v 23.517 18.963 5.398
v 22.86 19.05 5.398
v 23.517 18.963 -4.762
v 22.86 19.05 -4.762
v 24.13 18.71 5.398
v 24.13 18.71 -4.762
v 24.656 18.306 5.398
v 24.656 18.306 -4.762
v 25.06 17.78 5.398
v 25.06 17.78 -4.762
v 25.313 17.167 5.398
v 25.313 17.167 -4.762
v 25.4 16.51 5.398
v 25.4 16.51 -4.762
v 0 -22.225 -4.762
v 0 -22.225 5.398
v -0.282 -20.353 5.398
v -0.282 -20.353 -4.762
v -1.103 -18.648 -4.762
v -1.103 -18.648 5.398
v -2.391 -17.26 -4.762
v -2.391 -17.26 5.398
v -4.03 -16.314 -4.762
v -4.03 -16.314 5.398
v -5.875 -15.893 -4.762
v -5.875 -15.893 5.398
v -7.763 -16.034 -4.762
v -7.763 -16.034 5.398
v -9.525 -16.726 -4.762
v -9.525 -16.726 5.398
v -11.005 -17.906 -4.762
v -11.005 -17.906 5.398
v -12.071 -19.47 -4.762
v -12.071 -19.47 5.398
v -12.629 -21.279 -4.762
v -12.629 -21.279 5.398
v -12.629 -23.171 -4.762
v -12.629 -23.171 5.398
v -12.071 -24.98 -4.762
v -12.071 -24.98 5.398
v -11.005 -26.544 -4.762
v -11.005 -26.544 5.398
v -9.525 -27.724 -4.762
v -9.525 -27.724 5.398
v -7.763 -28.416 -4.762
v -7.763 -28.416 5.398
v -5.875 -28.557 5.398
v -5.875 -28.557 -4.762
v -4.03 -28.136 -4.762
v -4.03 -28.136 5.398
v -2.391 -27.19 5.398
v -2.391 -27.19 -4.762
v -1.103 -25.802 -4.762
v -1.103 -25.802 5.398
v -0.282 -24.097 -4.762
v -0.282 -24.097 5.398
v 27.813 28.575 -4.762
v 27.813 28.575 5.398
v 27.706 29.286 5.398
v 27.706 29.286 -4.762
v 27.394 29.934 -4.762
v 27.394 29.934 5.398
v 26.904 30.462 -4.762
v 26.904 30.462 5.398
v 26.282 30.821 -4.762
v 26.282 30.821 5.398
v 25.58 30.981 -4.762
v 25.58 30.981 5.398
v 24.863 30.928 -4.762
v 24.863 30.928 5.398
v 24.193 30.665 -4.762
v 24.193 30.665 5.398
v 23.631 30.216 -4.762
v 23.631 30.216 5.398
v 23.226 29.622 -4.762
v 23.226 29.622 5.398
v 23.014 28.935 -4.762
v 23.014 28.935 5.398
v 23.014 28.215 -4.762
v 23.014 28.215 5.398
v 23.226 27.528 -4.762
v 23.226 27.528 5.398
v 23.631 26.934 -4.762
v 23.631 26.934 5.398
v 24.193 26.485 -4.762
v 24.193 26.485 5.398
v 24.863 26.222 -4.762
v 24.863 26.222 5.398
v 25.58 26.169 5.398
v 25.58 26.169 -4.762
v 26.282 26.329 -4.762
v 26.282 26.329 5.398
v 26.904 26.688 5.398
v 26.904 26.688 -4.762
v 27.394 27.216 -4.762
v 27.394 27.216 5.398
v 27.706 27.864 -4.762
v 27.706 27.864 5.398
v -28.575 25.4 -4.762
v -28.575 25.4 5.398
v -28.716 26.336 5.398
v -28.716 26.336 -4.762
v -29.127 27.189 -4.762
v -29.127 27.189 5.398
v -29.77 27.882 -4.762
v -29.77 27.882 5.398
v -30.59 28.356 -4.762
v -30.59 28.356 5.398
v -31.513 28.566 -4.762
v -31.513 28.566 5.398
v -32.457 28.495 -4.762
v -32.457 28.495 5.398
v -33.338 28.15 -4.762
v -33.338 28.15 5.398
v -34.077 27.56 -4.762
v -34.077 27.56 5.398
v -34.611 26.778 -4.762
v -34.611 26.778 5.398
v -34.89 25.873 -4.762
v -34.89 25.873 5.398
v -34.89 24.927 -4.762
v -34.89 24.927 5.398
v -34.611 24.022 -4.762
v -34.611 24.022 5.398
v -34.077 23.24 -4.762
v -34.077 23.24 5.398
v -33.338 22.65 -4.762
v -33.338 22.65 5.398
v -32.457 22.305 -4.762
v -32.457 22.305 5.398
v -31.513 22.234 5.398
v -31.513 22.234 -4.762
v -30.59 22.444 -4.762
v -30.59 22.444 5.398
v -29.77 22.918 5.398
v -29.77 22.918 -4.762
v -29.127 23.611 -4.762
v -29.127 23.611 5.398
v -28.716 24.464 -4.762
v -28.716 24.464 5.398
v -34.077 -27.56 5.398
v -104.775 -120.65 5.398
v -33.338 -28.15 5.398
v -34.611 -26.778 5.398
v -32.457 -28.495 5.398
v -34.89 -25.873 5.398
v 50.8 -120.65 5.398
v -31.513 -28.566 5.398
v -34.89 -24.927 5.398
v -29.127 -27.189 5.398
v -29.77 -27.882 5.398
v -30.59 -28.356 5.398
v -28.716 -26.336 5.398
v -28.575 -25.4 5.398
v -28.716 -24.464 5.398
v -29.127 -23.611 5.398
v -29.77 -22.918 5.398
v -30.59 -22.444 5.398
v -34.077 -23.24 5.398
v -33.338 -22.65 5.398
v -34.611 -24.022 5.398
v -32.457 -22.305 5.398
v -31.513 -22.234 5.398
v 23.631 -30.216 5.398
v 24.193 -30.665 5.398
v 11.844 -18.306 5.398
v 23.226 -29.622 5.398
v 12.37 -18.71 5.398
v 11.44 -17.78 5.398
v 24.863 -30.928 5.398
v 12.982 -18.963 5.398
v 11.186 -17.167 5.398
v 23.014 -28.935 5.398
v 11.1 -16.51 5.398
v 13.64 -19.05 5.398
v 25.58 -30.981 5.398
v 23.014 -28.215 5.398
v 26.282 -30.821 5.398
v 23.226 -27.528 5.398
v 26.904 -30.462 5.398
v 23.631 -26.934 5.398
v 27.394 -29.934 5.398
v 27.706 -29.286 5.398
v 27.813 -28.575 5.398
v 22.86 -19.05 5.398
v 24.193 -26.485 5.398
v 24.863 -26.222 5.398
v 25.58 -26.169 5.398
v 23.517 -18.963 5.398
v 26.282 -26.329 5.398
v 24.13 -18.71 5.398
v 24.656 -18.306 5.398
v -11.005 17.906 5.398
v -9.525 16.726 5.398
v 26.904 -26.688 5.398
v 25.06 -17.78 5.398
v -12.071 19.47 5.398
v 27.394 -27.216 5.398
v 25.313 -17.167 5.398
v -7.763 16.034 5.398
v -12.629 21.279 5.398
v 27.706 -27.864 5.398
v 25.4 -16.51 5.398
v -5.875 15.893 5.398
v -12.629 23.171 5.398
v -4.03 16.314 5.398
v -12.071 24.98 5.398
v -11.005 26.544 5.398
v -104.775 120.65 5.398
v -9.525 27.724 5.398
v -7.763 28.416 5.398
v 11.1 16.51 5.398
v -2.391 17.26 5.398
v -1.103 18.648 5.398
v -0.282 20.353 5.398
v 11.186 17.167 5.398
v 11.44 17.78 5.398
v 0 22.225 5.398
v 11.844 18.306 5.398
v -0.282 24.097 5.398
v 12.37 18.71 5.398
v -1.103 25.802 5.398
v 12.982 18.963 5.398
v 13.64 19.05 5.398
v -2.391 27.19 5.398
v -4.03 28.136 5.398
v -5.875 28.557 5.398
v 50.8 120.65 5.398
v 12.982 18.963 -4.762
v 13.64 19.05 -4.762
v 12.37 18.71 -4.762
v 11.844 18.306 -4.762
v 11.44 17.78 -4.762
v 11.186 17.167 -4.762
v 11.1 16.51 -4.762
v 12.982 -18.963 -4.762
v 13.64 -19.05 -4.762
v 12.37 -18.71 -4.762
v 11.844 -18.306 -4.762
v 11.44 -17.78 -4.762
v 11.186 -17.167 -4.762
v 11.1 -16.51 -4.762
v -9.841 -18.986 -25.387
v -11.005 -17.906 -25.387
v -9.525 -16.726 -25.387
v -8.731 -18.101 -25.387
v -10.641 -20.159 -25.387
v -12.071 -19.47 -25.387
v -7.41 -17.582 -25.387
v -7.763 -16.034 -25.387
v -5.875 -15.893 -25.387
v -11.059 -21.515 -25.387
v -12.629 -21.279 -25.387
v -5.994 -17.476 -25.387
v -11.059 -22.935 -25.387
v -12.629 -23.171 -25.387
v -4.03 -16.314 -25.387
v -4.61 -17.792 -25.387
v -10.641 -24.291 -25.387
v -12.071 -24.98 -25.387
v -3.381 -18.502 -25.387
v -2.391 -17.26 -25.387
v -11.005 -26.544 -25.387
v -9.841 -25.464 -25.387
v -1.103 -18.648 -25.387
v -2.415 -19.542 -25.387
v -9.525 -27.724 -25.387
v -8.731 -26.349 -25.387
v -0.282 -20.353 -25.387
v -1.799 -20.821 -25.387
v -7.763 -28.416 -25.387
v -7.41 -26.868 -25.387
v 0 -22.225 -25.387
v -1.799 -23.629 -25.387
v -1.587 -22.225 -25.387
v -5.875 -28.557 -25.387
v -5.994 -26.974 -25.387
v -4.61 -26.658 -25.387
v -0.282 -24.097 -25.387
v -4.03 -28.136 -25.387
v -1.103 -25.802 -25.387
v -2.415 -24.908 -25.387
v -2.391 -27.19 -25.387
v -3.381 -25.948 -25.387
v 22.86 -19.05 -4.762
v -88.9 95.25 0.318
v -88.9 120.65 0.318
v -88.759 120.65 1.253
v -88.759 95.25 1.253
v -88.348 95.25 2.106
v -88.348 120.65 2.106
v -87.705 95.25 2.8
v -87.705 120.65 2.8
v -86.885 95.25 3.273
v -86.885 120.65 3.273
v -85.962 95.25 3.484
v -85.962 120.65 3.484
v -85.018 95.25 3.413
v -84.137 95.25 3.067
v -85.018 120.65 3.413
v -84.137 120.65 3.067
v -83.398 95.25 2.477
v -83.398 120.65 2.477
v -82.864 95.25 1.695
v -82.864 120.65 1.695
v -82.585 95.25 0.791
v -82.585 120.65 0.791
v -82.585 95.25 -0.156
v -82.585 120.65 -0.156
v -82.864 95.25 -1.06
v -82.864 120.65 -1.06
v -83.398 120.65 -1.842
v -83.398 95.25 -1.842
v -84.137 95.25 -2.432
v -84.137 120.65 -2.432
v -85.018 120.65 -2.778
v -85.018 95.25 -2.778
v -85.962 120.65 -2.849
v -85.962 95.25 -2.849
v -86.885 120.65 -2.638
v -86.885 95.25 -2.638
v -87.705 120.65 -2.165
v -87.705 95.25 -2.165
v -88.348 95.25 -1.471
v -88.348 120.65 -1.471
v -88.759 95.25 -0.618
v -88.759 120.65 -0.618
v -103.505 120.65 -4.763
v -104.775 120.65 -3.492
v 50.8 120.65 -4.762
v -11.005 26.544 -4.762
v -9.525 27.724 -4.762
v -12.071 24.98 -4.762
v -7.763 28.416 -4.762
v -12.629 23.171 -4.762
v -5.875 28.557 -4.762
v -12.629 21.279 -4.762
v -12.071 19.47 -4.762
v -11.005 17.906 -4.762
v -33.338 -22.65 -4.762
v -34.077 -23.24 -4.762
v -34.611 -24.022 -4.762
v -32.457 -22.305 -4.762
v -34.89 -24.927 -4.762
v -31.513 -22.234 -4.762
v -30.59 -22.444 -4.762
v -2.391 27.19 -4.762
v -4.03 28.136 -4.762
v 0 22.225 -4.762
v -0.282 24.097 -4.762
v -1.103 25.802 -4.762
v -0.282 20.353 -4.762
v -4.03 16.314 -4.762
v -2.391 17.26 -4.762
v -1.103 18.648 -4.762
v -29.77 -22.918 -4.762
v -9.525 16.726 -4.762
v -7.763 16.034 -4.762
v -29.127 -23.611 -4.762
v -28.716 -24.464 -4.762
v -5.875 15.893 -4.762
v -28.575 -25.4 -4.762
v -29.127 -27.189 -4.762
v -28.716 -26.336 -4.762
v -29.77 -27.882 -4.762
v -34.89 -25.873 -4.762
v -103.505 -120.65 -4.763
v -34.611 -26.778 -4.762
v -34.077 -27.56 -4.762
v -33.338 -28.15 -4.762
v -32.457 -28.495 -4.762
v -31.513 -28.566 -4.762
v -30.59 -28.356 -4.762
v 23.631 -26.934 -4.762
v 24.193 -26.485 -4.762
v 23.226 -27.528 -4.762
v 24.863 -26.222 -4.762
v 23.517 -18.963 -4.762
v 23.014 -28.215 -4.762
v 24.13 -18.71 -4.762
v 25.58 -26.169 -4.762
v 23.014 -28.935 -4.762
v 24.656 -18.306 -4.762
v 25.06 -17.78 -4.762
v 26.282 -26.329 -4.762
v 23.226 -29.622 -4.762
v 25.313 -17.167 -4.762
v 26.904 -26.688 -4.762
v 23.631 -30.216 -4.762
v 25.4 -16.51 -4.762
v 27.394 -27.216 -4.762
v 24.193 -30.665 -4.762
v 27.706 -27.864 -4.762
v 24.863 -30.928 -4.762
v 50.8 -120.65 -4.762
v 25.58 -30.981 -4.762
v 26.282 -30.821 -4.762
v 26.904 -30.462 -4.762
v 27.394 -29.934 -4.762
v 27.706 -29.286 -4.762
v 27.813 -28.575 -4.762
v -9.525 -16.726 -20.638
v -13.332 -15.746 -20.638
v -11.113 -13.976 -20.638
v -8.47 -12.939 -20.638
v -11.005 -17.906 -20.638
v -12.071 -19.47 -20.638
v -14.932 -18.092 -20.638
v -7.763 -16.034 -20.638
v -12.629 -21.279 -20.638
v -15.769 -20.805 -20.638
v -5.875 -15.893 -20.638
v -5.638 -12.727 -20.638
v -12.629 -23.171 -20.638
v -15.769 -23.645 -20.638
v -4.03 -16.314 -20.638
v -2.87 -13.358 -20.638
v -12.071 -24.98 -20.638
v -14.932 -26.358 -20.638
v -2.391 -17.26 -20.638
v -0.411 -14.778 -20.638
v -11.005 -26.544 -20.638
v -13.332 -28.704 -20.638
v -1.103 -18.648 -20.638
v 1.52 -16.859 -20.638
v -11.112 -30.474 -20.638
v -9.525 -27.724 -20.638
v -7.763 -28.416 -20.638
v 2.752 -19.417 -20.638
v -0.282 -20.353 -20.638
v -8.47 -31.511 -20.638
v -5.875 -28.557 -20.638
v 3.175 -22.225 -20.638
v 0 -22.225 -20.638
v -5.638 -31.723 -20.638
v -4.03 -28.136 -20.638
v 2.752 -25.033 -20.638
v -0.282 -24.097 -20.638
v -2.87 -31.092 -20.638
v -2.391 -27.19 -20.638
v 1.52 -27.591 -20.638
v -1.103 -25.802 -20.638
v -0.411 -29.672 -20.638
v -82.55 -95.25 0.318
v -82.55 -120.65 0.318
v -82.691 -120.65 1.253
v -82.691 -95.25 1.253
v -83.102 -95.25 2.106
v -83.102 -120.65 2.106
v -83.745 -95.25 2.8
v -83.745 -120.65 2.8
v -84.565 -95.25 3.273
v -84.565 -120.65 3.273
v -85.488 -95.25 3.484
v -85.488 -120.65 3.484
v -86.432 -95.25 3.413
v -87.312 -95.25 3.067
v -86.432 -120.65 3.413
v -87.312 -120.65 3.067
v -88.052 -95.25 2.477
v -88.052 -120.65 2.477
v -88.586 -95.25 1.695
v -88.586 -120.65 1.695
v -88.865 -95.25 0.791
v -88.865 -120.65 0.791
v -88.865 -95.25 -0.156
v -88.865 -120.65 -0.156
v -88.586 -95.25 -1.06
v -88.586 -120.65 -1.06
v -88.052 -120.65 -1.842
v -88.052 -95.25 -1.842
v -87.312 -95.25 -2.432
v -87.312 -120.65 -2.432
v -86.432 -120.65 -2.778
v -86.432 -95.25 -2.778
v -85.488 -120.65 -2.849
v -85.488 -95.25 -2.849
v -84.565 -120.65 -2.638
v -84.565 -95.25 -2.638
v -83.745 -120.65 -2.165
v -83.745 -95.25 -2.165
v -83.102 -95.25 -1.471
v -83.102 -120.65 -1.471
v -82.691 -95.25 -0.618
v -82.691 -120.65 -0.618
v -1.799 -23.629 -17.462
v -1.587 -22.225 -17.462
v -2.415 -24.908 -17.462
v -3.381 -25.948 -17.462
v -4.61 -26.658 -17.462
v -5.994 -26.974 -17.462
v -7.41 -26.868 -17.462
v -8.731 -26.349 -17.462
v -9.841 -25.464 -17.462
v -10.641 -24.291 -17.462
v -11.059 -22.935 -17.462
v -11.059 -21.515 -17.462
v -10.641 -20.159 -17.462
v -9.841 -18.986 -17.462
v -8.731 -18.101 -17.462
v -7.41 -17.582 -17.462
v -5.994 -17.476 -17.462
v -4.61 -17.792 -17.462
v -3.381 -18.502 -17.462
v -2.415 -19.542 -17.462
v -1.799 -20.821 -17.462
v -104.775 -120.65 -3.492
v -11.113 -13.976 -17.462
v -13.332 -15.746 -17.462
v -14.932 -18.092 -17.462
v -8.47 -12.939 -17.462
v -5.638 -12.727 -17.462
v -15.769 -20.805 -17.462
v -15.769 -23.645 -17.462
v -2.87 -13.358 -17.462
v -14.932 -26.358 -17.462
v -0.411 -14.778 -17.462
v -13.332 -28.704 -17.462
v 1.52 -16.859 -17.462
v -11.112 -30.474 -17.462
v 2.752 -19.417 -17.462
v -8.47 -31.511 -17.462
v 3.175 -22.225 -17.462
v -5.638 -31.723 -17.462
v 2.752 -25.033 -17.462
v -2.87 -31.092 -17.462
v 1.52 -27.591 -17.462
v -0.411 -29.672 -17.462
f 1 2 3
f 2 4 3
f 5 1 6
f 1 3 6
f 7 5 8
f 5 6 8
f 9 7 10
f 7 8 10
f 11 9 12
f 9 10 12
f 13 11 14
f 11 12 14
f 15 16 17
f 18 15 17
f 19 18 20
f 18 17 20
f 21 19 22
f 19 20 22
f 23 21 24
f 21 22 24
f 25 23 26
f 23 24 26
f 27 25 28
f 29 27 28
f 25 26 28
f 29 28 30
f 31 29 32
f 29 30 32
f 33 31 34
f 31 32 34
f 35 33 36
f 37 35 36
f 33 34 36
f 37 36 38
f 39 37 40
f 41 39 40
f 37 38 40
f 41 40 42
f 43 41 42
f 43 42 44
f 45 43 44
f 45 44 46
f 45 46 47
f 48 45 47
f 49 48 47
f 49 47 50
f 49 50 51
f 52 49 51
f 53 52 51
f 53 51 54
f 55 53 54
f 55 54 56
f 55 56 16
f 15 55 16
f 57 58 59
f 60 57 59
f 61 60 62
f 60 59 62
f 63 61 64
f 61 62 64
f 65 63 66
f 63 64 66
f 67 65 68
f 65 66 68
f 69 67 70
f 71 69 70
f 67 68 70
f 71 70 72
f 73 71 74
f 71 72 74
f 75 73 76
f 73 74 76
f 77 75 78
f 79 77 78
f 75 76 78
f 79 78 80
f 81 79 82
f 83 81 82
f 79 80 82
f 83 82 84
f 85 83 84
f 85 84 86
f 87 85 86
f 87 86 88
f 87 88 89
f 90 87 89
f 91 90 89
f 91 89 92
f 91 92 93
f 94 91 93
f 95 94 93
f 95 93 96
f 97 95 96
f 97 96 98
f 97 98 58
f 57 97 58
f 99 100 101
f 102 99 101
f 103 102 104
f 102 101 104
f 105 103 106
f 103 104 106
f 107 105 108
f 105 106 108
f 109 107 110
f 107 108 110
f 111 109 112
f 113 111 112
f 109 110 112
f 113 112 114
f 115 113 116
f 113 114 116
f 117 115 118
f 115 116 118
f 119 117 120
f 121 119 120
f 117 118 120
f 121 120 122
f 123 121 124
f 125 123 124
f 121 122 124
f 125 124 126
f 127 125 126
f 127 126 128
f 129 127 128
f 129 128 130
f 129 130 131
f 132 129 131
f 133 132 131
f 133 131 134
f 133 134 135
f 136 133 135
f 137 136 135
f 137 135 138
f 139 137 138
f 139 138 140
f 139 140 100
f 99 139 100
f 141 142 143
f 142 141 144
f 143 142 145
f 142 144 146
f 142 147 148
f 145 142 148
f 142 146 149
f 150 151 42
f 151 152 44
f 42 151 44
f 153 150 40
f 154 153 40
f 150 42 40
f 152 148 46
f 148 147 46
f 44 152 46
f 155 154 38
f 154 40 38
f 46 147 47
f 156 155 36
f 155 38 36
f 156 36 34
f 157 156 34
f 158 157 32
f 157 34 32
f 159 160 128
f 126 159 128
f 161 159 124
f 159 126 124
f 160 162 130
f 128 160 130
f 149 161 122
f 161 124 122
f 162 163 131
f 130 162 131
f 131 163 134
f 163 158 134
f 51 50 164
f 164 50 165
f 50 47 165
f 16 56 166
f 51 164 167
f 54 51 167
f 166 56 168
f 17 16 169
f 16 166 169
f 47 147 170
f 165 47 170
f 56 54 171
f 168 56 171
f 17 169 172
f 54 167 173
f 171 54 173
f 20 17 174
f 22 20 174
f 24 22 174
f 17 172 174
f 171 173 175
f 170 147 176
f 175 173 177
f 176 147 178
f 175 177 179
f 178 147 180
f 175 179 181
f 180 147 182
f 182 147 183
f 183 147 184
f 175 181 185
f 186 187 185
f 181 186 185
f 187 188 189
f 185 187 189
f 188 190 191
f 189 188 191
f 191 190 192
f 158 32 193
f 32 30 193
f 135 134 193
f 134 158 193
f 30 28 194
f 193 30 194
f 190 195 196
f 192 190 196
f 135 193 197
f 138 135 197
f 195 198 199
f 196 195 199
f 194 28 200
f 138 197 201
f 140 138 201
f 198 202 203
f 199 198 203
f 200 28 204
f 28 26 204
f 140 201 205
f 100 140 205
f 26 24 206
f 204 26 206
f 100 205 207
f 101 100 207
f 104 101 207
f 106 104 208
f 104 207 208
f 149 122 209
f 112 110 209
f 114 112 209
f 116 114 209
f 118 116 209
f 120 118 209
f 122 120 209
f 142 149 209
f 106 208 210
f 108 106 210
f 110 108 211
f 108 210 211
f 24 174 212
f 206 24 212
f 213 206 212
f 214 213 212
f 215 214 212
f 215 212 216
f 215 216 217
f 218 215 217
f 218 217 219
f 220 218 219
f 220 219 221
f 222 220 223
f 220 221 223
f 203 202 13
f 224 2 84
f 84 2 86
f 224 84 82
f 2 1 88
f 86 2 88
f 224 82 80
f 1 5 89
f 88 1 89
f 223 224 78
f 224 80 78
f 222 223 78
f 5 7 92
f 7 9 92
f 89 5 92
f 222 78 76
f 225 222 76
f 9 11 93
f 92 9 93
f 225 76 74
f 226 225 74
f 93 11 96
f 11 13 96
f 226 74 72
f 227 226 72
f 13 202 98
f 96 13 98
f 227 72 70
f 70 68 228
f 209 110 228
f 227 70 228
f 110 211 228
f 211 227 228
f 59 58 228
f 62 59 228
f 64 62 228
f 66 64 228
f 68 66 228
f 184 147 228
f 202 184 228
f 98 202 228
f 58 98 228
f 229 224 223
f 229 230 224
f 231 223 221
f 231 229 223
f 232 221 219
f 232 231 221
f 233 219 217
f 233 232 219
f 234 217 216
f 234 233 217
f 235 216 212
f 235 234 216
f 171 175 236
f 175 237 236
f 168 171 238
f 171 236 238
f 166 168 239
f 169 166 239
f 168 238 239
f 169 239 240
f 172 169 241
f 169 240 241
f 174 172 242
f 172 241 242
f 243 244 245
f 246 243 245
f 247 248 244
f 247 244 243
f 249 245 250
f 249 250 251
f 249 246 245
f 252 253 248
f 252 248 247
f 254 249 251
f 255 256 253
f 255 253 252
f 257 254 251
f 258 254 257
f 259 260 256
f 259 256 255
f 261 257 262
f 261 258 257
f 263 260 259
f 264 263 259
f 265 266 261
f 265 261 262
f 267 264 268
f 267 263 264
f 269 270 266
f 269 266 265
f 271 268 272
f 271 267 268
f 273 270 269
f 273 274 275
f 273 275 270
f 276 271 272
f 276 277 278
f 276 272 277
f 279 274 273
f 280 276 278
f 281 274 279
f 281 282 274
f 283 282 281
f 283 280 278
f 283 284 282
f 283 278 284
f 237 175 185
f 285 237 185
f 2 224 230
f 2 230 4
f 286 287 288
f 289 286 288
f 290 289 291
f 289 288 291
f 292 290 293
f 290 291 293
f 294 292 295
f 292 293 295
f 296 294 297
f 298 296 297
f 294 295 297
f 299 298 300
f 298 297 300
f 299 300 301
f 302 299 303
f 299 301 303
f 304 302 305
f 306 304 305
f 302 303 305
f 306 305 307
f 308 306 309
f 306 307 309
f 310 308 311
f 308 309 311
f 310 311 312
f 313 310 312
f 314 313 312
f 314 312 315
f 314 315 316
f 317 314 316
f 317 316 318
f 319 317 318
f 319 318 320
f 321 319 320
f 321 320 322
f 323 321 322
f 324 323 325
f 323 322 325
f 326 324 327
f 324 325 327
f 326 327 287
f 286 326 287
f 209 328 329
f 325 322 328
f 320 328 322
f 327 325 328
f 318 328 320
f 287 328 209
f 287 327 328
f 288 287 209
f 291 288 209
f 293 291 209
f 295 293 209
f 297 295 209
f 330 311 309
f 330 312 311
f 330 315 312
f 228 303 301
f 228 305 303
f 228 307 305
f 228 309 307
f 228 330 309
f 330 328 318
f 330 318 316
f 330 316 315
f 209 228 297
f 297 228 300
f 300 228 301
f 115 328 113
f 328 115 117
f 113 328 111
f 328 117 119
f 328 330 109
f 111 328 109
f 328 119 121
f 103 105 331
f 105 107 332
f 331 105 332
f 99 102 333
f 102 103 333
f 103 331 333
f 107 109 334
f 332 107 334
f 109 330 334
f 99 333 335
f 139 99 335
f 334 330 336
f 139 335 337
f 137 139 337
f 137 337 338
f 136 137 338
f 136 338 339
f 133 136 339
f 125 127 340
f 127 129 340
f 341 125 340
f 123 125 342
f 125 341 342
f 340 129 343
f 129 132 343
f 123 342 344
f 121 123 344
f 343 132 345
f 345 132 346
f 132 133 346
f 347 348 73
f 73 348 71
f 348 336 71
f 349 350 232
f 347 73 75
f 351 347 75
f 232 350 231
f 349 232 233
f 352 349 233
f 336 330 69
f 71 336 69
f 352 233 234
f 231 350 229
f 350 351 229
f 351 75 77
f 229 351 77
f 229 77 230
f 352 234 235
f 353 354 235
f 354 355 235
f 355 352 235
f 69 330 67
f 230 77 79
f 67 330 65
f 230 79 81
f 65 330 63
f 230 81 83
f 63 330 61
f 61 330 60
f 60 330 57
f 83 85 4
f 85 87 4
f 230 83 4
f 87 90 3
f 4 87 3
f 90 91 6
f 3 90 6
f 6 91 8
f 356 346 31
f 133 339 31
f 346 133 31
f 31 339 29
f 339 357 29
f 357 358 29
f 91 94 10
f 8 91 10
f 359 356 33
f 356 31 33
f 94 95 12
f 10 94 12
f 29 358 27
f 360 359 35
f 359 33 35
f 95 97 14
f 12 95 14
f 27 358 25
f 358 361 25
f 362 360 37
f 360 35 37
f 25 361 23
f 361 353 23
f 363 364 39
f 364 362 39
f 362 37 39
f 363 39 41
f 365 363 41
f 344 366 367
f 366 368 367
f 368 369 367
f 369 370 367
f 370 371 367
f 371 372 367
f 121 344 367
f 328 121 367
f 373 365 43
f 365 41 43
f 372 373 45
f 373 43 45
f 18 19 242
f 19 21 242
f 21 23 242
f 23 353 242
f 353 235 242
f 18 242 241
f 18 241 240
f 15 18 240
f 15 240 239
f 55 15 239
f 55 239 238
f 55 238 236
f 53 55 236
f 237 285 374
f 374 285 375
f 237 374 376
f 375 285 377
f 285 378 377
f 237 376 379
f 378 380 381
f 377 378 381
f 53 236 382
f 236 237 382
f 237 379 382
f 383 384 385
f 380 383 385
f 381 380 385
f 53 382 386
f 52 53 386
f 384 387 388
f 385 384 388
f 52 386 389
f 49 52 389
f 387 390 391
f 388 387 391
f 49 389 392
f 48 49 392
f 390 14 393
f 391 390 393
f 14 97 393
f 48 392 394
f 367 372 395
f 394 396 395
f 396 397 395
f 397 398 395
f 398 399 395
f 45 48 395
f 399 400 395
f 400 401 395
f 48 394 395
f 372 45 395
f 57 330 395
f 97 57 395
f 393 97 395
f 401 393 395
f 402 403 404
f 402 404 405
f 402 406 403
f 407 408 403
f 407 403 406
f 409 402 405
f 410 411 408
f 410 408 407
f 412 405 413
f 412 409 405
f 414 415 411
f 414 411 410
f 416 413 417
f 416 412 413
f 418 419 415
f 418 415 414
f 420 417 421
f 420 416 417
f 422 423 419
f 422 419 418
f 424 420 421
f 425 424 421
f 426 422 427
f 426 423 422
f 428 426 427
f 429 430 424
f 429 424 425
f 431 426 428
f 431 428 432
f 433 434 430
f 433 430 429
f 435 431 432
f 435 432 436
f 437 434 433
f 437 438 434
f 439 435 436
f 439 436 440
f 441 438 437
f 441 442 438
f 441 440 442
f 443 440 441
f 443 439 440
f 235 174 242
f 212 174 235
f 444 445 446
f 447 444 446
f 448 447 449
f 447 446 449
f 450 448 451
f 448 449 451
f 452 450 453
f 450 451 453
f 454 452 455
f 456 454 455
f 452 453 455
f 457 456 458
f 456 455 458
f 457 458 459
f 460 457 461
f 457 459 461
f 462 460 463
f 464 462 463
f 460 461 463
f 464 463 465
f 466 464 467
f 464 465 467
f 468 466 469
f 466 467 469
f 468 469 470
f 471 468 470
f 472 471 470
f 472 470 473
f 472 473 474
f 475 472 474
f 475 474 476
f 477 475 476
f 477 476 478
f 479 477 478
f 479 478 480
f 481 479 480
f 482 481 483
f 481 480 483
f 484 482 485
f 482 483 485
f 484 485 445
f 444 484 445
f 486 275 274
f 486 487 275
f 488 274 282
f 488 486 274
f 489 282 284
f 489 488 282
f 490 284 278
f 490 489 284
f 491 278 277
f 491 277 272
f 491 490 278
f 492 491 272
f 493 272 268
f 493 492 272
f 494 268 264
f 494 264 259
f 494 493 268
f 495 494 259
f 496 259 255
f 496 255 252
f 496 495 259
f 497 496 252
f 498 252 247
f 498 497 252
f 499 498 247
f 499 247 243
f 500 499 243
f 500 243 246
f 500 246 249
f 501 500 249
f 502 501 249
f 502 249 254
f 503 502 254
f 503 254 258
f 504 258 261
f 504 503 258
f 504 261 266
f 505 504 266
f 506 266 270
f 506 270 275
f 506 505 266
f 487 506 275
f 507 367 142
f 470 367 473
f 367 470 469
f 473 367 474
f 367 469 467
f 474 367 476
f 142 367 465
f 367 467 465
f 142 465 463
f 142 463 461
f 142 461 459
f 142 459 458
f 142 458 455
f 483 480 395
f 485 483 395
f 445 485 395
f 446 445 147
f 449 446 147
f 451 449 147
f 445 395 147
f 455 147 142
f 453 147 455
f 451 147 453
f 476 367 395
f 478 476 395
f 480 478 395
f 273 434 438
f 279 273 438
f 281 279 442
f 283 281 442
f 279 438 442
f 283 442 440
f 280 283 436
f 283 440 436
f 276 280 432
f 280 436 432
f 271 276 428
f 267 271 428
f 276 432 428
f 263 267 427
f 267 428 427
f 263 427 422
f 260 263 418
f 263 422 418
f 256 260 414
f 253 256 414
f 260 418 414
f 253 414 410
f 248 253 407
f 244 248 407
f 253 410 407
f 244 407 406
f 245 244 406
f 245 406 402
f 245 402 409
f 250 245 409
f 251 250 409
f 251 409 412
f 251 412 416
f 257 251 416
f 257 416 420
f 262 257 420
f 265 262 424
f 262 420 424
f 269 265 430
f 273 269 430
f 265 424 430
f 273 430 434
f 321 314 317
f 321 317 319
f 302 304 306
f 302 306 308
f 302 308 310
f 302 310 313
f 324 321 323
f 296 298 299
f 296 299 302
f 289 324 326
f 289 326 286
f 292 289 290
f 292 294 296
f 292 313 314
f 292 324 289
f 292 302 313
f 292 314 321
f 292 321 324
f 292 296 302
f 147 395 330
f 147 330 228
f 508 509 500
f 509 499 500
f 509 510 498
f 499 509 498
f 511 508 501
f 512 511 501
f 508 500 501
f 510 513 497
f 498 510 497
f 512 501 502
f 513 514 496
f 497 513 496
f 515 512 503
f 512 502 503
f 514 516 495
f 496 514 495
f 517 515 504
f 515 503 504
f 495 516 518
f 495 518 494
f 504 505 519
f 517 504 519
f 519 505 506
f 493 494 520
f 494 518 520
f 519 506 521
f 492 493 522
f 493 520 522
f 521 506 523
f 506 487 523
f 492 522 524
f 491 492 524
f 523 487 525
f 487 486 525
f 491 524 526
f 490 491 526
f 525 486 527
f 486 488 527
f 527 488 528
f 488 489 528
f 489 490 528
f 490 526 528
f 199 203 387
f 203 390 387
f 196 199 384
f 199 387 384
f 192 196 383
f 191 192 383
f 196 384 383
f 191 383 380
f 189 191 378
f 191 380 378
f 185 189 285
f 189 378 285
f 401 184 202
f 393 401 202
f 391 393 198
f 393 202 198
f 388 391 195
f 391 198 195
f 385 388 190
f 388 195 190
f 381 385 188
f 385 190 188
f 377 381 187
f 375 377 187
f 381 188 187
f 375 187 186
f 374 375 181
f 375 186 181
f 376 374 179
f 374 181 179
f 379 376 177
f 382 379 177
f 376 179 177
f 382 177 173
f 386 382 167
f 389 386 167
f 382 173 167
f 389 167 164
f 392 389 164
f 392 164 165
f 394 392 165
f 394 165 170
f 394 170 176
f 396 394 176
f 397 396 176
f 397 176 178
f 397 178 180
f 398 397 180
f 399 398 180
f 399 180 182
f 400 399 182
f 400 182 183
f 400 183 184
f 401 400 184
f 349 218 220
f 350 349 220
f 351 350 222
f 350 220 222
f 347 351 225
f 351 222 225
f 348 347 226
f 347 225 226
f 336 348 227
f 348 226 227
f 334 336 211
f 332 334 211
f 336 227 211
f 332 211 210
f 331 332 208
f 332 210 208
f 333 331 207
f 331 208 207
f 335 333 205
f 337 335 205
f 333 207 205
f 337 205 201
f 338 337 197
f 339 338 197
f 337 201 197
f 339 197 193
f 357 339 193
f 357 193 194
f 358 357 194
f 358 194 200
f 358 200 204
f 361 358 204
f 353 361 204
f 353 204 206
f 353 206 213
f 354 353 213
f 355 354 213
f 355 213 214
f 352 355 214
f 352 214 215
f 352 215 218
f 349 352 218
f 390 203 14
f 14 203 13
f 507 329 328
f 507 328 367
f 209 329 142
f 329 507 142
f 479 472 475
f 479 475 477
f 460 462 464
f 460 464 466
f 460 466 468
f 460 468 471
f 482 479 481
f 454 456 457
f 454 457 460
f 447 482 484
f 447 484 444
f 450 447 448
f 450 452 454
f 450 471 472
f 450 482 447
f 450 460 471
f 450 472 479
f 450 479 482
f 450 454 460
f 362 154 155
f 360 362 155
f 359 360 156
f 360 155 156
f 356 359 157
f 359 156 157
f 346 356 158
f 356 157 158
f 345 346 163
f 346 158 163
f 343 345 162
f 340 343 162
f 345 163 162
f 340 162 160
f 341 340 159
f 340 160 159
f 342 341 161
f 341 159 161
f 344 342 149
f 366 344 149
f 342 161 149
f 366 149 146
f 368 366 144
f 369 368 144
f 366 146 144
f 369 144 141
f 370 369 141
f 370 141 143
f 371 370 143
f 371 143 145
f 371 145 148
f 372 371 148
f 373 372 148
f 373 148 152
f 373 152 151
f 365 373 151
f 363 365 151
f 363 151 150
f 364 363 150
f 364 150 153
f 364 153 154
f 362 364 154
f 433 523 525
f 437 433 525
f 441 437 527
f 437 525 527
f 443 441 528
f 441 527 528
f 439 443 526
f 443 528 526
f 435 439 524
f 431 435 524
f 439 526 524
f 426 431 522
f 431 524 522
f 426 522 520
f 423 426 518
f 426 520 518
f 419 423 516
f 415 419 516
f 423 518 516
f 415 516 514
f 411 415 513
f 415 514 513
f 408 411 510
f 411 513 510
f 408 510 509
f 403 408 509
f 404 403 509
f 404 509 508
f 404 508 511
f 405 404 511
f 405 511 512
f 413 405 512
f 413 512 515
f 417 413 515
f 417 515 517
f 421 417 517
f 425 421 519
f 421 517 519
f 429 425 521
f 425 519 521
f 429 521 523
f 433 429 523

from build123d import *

# Parameters (mm, degrees)
F0_W          = 139.7
F0_H          = 10.16
F1_DEPTH      = 120.65
F1_DEPTH_BACK = 120.65
F2_R          = 3.175
F2_R_2        = 6.35
F2_R_3        = 2.413
F2_W          = 14.3002
F2_H          = 38.1
F3_DEPTH      = 10.161
F4_R          = 2.54
F5_DEPTH      = 15.875
F6_R          = 3.175
F7_DEPTH      = 25.4
F8_R          = 3.175
F9_DEPTH      = 25.4
F10_SIZE      = 1.27
F12_R         = 9.525
F12_R_2       = 4.7625
F13_DEPTH     = 3.175
F14_R         = 6.35
F14_R_2       = 4.7625
F15_DEPTH     = 4.7498


with BuildPart() as f1:
    # F0 (on Front) → F1 (new body, two sides)
    with BuildSketch(Plane.XZ) as f1_sk:
        with Locations((-19.05, 0.3175)):
            Rectangle(F0_W, F0_H)
    extrude(amount=F1_DEPTH)
    extrude(f1_sk.sketch, amount=-F1_DEPTH_BACK)

    # F2 (on face) → F3 (cut, through all)
    with BuildSketch(Plane.XY.offset(5.3975)):
        with Locations((-31.75, 25.4)):
            Circle(F2_R)
        with Locations((-31.75, -25.4)):
            Circle(F2_R)
        with Locations((-6.35, 22.225)):
            Circle(F2_R_2)
        with Locations((-6.35, -22.225)):
            Circle(F2_R_2)
        with Locations((25.4, 28.575)):
            Circle(F2_R_3)
        with Locations((25.4, -28.575)):
            Circle(F2_R_3)
        with Locations((18.2499, 0)):
            Rectangle(F2_W, F2_H)
    extrude(amount=-F3_DEPTH, mode=Mode.SUBTRACT)

    # F4
    f4_edges = [f1.edges().sort_by_distance(p)[0] for p in [
        (11.0998, 19.05, 0.3175),
        (25.4, 19.05, 0.3175),
        (11.0998, -19.05, 0.3175),
        (25.4, -19.05, 0.3175),
    ]]
    fillet(f4_edges, radius=F4_R)

    # F5 (add): a face of the model
    f5_faces = [f1.faces().sort_by_distance(p)[0] for p in [
        (-88.9, 0, 0.3175),
    ]]
    extrude(f5_faces, amount=F5_DEPTH)

    # F6 (on face) → F7 (cut)
    with BuildSketch(Plane.XZ.offset(120.65)):
        with Locations((-85.725, 0.3175)):
            Circle(F6_R)
    extrude(amount=-F7_DEPTH, mode=Mode.SUBTRACT)

    # F8 (on face) → F9 (cut)
    with BuildSketch(Plane(origin=(0, 120.65, 0), x_dir=(-1, 0, 0), z_dir=(0, 1, 0))):
        with Locations((85.725, 0.3175)):
            Circle(F8_R)
    extrude(amount=-F9_DEPTH, mode=Mode.SUBTRACT)

    # F10
    f10_edges = [f1.edges().sort_by_distance(p)[0] for p in [
        (-104.775, 0, -4.7625),
    ]]
    chamfer(f10_edges, length=F10_SIZE)


with BuildPart() as f13:
    # F12 (on offset) → F13 (new body)
    with BuildSketch(Plane(origin=(0, 0, -17.4625), x_dir=(1, 0, 0), z_dir=(0, 0, -1))):
        with Locations((-6.35, 22.225)):
            Circle(F12_R)
        with Locations((-6.35, 22.225)):
            Circle(F12_R_2, mode=Mode.SUBTRACT)
    extrude(amount=F13_DEPTH)

    # F14 (on face) → F15 (join)
    with BuildSketch(Plane(origin=(0, 0, -20.6375), x_dir=(1, 0, 0), z_dir=(0, 0, -1))):
        with Locations((-6.35, 22.225)):
            Circle(F14_R)
        with Locations((-6.35, 22.225)):
            Circle(F14_R_2, mode=Mode.SUBTRACT)
    extrude(amount=F15_DEPTH)


solid = Compound([f1.part, f13.part])
